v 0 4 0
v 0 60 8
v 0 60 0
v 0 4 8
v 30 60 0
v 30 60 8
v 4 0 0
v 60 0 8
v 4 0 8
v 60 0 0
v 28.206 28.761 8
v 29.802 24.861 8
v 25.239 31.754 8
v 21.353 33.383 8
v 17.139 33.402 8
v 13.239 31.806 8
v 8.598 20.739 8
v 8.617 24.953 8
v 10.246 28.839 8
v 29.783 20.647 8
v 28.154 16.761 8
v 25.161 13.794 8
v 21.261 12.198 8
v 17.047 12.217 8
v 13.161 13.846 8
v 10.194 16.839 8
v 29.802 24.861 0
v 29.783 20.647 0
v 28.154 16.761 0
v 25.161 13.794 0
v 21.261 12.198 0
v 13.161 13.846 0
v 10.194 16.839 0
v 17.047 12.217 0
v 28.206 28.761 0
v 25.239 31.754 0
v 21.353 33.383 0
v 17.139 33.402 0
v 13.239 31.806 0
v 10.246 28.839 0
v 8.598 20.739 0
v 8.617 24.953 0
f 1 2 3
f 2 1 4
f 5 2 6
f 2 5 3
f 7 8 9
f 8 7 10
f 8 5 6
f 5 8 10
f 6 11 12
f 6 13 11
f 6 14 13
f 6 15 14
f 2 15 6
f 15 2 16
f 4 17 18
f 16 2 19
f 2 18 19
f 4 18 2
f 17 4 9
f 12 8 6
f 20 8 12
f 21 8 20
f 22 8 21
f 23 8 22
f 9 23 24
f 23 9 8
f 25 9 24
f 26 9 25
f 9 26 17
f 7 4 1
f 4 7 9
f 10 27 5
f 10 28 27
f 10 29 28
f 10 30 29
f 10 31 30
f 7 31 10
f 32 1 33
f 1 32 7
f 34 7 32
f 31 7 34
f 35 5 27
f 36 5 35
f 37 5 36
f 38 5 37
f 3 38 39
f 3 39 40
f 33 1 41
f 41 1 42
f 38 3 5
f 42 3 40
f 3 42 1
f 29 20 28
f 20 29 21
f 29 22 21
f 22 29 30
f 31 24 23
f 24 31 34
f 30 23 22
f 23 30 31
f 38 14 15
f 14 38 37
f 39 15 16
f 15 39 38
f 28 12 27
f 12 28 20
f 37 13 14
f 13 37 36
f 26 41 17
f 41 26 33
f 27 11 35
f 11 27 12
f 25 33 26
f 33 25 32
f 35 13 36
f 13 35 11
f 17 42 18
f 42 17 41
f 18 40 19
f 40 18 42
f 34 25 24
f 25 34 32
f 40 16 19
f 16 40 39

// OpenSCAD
$fn = 32;

// ----------------------------------------------------------------------
// Bracket plate: gusset 60 x 60
// ----------------------------------------------------------------------

// --- parameters (mm) ---
hole_r = 3.5;             // bolt hole radius
plate_t = 8;              // plate thickness, Z (extrusion height)
gus_a = 60;               // base length
gus_b = 60;               // height
top_x = 30;               // top edge X of the angled cut
light_r = 10.8;           // lightening hole radius

light_d = 2 * light_r;

profile = [[4, 0], [30, 0], [60, 0], [30, 60], [0, 60], [0, 4]];  // primary outline, 6 points, counter clockwise
void_1 = [[29.802, 24.861], [28.206, 28.761], [25.239, 31.754], [21.353, 33.383], [17.139, 33.402], [13.239, 31.806], [10.246, 28.839], [8.617, 24.953], [8.598, 20.739], [10.194, 16.839], [13.161, 13.846], [17.047, 12.217], [21.261, 12.198], [25.161, 13.794], [28.154, 16.761], [29.783, 20.647]];  // lightening hole, 16 points

// --- the one profile operation ---
difference() {
  linear_extrude(height = plate_t) polygon(points = profile);
  translate([0, 0, -1])
    linear_extrude(height = plate_t + 2) polygon(points = void_1);
}
